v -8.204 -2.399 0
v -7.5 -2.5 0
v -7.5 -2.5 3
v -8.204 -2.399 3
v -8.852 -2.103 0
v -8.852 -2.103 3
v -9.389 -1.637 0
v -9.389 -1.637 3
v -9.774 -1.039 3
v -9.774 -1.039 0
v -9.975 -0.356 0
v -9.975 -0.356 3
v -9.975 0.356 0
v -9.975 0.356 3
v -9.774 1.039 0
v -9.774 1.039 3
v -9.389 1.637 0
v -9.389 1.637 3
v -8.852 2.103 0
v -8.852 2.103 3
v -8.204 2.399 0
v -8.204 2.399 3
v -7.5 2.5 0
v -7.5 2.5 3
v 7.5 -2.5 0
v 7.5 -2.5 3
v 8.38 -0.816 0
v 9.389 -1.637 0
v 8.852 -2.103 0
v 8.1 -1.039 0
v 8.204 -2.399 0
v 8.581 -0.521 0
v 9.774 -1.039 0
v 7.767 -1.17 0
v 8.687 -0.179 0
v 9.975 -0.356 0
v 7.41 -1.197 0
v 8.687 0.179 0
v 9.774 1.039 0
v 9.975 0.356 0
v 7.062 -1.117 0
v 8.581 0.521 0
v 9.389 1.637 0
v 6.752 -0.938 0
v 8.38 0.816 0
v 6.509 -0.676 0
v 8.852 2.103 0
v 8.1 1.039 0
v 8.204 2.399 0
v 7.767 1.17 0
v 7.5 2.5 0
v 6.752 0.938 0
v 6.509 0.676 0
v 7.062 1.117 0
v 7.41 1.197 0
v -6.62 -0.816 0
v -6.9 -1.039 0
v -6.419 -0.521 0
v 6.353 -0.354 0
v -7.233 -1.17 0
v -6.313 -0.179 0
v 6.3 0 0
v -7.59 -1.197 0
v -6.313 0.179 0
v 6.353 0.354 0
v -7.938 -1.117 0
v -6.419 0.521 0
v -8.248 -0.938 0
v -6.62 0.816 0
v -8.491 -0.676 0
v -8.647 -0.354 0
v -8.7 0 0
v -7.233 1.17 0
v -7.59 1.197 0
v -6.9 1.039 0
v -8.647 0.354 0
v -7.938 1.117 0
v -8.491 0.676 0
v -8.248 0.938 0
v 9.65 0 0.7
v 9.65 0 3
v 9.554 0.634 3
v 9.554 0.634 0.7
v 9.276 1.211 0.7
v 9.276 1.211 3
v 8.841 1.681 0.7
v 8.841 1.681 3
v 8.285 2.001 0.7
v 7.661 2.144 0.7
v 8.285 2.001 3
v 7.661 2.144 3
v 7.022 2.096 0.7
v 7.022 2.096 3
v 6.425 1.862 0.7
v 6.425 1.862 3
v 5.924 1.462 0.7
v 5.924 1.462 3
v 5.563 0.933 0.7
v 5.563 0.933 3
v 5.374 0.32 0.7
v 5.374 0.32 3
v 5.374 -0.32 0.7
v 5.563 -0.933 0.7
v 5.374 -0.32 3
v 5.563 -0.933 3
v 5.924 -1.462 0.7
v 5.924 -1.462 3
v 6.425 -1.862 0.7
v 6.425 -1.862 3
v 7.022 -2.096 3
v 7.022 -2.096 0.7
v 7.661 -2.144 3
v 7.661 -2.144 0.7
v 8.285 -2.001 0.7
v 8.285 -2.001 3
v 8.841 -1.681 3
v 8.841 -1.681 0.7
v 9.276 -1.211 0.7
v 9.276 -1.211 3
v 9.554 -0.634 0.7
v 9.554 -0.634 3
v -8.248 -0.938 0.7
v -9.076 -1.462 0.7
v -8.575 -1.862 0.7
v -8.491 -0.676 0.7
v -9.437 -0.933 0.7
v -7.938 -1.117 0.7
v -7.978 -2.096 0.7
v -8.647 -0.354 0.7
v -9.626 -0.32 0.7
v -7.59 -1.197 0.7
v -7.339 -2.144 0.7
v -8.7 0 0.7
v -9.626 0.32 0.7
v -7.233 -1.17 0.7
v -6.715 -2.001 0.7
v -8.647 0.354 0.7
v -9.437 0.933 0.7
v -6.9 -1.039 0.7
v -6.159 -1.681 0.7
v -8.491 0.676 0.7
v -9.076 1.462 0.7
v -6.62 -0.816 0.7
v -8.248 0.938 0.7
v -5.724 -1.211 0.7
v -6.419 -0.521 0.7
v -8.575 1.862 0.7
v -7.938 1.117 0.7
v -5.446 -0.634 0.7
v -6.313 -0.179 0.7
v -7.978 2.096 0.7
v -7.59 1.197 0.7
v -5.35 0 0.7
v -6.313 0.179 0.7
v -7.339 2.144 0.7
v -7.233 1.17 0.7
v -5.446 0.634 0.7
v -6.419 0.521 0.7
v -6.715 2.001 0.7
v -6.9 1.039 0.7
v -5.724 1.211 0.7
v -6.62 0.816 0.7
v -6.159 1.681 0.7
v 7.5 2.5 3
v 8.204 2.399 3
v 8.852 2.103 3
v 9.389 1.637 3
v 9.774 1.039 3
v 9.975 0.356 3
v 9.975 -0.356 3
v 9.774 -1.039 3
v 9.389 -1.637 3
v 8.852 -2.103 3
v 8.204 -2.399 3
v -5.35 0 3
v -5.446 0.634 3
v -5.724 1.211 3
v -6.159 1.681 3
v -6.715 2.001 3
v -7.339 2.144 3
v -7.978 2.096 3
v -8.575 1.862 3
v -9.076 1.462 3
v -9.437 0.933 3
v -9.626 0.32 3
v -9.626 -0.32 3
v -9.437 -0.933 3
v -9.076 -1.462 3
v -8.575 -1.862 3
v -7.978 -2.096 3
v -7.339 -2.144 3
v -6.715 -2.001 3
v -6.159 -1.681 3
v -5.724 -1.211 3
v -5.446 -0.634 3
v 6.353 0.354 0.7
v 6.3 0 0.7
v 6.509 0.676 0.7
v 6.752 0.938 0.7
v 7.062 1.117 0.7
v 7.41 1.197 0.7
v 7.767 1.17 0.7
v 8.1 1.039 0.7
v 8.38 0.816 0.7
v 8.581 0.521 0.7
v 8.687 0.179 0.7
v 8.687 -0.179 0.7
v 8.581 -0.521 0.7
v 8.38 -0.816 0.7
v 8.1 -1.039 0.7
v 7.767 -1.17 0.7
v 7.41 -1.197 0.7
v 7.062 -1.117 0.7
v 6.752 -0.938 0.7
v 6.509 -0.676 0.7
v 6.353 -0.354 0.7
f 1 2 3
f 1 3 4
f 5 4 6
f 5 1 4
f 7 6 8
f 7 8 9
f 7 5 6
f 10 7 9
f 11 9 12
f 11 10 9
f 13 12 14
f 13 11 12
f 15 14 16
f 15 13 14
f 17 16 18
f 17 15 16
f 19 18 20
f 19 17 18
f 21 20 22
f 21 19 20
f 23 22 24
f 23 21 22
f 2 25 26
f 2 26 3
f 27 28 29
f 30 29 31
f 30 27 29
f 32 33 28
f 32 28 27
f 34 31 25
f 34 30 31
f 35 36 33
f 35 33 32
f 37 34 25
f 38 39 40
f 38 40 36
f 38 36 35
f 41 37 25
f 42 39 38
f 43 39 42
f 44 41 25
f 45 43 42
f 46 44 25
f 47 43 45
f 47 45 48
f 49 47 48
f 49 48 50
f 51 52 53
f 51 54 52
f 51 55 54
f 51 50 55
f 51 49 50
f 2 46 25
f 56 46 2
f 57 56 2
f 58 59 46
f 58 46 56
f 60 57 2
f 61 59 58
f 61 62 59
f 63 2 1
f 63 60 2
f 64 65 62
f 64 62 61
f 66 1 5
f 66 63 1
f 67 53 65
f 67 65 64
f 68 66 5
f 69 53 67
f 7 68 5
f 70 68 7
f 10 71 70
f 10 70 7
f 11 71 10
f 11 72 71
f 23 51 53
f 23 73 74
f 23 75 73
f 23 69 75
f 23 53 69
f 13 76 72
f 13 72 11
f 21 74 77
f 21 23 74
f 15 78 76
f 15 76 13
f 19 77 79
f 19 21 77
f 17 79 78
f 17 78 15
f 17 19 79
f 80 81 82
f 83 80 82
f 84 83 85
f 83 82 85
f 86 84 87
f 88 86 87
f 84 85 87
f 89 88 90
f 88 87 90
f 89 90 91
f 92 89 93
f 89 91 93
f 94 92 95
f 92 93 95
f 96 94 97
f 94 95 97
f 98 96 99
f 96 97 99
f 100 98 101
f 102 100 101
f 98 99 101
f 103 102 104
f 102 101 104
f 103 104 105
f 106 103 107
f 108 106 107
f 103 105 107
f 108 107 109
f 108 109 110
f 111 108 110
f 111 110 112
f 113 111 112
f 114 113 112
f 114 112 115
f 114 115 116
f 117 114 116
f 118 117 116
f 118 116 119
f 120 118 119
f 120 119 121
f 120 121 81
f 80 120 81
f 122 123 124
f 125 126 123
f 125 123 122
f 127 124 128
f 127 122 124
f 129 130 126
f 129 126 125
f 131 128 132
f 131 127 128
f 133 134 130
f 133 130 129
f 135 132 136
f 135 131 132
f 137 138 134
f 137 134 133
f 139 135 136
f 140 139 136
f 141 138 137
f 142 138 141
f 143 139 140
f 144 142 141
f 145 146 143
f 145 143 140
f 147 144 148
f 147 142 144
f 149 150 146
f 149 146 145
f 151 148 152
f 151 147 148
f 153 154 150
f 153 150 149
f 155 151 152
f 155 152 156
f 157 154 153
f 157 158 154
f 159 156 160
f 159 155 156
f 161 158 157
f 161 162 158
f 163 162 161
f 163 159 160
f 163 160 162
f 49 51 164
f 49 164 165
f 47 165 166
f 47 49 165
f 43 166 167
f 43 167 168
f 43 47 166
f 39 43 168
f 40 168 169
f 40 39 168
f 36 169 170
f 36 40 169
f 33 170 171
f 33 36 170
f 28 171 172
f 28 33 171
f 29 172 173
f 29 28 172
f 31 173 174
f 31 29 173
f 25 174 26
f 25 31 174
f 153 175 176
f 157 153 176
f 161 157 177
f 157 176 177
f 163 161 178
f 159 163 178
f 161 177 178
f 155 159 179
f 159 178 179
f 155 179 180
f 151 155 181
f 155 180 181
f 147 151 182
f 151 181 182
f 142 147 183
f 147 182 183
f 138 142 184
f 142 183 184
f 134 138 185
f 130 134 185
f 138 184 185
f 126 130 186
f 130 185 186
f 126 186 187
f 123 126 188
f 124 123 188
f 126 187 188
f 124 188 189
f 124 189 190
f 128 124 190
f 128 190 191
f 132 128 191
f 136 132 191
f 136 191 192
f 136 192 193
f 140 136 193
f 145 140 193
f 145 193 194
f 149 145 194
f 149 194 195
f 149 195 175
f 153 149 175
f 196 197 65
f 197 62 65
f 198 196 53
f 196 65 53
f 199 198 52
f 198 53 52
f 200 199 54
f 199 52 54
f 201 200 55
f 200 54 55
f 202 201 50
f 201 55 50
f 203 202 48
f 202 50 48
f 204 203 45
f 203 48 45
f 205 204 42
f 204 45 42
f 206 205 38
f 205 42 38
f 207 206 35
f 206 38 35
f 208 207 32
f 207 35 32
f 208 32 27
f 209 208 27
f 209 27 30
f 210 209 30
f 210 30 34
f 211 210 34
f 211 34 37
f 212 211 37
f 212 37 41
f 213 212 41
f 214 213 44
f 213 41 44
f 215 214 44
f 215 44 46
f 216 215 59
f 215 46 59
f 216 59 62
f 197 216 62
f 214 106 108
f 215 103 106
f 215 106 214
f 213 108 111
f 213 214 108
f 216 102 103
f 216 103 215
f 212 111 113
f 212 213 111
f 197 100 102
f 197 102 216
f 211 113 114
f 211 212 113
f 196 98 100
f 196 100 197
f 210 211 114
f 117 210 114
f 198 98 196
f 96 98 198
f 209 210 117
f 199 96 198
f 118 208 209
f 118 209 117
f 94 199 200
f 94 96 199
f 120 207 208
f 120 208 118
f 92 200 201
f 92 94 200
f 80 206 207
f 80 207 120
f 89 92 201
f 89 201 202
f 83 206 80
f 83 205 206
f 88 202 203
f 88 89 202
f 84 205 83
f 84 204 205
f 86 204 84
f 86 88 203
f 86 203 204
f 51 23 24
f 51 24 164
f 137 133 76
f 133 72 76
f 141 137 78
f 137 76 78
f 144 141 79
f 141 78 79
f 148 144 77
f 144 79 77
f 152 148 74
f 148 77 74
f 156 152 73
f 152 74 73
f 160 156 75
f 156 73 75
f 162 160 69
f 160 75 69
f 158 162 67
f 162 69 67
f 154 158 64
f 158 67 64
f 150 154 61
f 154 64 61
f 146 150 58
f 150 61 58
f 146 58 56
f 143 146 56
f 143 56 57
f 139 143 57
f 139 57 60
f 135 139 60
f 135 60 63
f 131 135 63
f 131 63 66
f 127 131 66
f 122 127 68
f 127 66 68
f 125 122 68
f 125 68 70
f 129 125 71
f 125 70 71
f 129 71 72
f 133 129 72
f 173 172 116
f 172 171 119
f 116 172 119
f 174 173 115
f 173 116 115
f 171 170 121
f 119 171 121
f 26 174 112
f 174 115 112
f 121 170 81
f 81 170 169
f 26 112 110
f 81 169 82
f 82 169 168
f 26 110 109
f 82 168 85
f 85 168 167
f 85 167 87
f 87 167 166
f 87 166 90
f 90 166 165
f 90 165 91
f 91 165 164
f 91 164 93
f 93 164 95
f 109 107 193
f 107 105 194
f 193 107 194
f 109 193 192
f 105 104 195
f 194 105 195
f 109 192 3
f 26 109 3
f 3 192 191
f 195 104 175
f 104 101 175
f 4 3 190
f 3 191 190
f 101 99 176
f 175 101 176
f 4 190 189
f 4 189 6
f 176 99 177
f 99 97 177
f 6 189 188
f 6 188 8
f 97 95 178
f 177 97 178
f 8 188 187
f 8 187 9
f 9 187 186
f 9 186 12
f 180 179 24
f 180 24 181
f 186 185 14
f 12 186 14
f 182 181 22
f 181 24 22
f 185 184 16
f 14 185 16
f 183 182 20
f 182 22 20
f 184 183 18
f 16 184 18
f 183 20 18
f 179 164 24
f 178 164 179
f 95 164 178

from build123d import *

# Parameters (mm, degrees)
EXTRUDE_1_DEPTH           = 3
HOLE_WIZARD_1_D           = 2.4
HOLE_WIZARD_1_DEPTH       = 5.2
HOLE_WIZARD_1_CBORE_D     = 4.3
HOLE_WIZARD_1_CBORE_DEPTH = 2.3
HOLE_WIZARD_1_TIP         = 0.721032743


with BuildPart() as part:
    # 草图1 → 凸台-拉伸1 (new body)
    with BuildSketch(Plane.XY):
        with BuildLine():
            Line((-7.5, 2.5), (7.5, 2.5))
            ThreePointArc((7.5, 2.5), (10, 0), (7.5, -2.5))
            Line((7.5, -2.5), (-7.5, -2.5))
            ThreePointArc((-7.5, -2.5), (-10, 0), (-7.5, 2.5))
        make_face()
    extrude(amount=EXTRUDE_1_DEPTH)

    # 打孔尺寸(%根据)内六角圆柱头螺钉的类型1
    with Locations(Plane.XY.offset(3)):
        with Locations((-7.5, 0), (7.5, 0)):
            CounterBoreHole(HOLE_WIZARD_1_D / 2, HOLE_WIZARD_1_CBORE_D / 2, HOLE_WIZARD_1_CBORE_DEPTH, depth=HOLE_WIZARD_1_DEPTH)
            with Locations((0, 0, -(HOLE_WIZARD_1_DEPTH + HOLE_WIZARD_1_TIP / 2))):  # 118° drill point
                Cone(0, HOLE_WIZARD_1_D / 2, HOLE_WIZARD_1_TIP, mode=Mode.SUBTRACT)


solid = part.part
